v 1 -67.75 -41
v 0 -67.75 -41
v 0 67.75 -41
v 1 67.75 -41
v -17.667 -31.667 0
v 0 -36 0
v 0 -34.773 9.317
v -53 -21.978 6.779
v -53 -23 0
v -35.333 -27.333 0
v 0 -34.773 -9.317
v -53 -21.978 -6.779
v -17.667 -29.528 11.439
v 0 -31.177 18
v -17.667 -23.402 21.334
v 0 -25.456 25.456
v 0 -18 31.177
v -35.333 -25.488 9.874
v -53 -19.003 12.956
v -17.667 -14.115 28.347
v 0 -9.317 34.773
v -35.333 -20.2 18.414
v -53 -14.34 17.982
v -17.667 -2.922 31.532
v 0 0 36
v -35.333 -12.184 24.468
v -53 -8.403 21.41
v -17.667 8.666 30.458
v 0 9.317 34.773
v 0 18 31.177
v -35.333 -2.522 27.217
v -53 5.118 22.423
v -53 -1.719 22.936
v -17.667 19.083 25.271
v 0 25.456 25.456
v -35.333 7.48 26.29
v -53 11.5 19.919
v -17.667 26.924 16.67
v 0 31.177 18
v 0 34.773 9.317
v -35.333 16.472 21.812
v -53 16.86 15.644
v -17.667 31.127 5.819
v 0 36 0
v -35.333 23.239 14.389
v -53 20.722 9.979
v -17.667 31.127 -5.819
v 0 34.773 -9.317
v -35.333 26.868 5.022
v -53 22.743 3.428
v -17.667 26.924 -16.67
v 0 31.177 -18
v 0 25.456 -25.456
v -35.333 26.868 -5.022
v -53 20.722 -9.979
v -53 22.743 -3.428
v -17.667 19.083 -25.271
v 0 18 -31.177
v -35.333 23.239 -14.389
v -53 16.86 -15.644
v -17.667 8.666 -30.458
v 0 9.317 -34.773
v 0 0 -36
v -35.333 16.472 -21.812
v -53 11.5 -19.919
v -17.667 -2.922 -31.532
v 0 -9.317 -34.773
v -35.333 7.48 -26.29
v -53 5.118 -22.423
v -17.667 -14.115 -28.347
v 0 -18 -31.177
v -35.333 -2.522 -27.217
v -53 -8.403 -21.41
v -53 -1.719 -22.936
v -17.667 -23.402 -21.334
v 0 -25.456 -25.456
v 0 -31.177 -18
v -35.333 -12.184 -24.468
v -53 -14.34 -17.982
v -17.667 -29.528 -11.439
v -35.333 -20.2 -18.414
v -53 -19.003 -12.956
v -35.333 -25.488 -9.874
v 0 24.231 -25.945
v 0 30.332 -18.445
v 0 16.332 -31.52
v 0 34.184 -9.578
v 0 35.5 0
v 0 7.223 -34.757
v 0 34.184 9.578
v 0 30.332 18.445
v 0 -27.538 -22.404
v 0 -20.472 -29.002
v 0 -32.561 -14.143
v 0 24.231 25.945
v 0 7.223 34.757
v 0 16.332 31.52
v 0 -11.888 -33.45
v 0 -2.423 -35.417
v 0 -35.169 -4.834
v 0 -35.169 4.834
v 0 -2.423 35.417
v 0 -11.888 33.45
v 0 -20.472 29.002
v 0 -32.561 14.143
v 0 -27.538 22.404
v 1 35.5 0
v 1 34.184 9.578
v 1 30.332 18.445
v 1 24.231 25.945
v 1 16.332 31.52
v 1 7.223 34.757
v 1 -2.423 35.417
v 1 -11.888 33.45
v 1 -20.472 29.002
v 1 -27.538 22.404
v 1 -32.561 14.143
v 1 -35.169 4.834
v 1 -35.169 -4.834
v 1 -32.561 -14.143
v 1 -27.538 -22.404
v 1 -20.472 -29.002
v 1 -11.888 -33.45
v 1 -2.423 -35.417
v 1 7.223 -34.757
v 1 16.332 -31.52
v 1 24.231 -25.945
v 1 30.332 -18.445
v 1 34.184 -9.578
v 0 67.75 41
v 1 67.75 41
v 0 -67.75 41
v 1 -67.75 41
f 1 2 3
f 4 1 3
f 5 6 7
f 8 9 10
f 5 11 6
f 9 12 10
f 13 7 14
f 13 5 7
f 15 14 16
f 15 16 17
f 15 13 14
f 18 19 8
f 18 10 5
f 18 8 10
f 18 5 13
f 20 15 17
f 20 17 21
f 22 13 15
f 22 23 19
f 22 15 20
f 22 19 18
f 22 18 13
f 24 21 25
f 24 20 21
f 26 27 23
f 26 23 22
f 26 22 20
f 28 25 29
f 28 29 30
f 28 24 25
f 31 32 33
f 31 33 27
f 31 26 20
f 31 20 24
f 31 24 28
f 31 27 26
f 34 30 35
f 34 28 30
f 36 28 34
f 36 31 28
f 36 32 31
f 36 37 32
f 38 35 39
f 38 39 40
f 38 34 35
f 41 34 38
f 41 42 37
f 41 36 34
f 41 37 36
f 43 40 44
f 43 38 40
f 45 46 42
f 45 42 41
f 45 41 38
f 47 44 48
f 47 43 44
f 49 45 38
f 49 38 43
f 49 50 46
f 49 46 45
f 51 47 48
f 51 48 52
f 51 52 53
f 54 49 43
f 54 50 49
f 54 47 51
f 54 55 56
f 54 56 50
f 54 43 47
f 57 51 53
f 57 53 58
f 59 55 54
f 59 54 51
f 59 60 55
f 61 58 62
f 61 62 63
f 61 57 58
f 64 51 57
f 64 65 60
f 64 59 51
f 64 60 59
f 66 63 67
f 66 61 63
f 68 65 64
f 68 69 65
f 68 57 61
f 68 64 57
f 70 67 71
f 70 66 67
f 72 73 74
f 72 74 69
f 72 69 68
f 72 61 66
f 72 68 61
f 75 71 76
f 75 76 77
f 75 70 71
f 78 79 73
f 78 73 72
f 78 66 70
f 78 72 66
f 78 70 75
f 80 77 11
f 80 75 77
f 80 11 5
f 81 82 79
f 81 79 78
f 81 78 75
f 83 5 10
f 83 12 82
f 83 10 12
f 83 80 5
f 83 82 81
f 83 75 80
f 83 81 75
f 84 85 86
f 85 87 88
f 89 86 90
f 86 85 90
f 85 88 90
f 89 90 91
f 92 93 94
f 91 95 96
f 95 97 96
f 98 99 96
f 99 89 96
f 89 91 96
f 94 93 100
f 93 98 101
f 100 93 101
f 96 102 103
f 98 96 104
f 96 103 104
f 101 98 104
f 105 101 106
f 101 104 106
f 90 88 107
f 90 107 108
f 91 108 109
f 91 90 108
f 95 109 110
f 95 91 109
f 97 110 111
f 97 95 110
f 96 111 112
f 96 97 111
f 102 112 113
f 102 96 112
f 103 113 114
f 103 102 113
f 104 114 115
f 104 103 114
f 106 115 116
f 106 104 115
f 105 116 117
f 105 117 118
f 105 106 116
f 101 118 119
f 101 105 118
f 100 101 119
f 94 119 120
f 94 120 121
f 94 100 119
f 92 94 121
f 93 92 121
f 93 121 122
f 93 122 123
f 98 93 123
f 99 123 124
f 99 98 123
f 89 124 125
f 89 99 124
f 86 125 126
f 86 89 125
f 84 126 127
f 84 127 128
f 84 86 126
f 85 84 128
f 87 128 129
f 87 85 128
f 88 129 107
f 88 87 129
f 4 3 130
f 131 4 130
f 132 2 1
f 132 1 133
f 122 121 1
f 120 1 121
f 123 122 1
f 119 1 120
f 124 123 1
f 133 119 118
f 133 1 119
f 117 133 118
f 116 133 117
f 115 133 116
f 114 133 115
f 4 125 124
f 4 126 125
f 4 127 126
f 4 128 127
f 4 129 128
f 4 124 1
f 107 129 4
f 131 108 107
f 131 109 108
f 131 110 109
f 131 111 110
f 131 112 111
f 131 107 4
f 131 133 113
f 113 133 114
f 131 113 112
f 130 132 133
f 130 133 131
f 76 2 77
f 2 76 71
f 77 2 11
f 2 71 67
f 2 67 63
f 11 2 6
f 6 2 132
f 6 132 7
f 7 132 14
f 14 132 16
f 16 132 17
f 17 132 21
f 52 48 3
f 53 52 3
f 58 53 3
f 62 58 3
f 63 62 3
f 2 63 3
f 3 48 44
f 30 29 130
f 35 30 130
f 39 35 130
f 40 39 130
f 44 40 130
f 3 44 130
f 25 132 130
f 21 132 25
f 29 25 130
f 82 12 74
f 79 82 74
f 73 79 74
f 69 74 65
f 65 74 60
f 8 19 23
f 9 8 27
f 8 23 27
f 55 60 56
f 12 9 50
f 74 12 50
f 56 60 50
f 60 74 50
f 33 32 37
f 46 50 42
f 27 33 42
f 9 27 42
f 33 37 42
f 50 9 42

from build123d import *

# Parameters (mm, degrees)
F0_W     = 135.5
F0_H     = 82
F0_R     = 35.5
F1_DEPTH = 1
F2_R     = 36
F4_R     = 23


with BuildPart() as f1:
    # F0 (on Right) → F1 (new body)
    with BuildSketch(Plane.YZ):
        Rectangle(F0_W, F0_H)
        Circle(F0_R, mode=Mode.SUBTRACT)
    extrude(amount=F1_DEPTH)

    # F2 (on face) → F5 section 0
    with BuildSketch(Plane(origin=(0, 0, 0), x_dir=(0, -1, 0), z_dir=(-1, 0, 0))):
        Circle(F2_R)
    # F4 (on offset) → F5 section 1
    with BuildSketch(Plane.YZ.offset(-53)):
        Circle(F4_R)
    loft()


solid = f1.part
